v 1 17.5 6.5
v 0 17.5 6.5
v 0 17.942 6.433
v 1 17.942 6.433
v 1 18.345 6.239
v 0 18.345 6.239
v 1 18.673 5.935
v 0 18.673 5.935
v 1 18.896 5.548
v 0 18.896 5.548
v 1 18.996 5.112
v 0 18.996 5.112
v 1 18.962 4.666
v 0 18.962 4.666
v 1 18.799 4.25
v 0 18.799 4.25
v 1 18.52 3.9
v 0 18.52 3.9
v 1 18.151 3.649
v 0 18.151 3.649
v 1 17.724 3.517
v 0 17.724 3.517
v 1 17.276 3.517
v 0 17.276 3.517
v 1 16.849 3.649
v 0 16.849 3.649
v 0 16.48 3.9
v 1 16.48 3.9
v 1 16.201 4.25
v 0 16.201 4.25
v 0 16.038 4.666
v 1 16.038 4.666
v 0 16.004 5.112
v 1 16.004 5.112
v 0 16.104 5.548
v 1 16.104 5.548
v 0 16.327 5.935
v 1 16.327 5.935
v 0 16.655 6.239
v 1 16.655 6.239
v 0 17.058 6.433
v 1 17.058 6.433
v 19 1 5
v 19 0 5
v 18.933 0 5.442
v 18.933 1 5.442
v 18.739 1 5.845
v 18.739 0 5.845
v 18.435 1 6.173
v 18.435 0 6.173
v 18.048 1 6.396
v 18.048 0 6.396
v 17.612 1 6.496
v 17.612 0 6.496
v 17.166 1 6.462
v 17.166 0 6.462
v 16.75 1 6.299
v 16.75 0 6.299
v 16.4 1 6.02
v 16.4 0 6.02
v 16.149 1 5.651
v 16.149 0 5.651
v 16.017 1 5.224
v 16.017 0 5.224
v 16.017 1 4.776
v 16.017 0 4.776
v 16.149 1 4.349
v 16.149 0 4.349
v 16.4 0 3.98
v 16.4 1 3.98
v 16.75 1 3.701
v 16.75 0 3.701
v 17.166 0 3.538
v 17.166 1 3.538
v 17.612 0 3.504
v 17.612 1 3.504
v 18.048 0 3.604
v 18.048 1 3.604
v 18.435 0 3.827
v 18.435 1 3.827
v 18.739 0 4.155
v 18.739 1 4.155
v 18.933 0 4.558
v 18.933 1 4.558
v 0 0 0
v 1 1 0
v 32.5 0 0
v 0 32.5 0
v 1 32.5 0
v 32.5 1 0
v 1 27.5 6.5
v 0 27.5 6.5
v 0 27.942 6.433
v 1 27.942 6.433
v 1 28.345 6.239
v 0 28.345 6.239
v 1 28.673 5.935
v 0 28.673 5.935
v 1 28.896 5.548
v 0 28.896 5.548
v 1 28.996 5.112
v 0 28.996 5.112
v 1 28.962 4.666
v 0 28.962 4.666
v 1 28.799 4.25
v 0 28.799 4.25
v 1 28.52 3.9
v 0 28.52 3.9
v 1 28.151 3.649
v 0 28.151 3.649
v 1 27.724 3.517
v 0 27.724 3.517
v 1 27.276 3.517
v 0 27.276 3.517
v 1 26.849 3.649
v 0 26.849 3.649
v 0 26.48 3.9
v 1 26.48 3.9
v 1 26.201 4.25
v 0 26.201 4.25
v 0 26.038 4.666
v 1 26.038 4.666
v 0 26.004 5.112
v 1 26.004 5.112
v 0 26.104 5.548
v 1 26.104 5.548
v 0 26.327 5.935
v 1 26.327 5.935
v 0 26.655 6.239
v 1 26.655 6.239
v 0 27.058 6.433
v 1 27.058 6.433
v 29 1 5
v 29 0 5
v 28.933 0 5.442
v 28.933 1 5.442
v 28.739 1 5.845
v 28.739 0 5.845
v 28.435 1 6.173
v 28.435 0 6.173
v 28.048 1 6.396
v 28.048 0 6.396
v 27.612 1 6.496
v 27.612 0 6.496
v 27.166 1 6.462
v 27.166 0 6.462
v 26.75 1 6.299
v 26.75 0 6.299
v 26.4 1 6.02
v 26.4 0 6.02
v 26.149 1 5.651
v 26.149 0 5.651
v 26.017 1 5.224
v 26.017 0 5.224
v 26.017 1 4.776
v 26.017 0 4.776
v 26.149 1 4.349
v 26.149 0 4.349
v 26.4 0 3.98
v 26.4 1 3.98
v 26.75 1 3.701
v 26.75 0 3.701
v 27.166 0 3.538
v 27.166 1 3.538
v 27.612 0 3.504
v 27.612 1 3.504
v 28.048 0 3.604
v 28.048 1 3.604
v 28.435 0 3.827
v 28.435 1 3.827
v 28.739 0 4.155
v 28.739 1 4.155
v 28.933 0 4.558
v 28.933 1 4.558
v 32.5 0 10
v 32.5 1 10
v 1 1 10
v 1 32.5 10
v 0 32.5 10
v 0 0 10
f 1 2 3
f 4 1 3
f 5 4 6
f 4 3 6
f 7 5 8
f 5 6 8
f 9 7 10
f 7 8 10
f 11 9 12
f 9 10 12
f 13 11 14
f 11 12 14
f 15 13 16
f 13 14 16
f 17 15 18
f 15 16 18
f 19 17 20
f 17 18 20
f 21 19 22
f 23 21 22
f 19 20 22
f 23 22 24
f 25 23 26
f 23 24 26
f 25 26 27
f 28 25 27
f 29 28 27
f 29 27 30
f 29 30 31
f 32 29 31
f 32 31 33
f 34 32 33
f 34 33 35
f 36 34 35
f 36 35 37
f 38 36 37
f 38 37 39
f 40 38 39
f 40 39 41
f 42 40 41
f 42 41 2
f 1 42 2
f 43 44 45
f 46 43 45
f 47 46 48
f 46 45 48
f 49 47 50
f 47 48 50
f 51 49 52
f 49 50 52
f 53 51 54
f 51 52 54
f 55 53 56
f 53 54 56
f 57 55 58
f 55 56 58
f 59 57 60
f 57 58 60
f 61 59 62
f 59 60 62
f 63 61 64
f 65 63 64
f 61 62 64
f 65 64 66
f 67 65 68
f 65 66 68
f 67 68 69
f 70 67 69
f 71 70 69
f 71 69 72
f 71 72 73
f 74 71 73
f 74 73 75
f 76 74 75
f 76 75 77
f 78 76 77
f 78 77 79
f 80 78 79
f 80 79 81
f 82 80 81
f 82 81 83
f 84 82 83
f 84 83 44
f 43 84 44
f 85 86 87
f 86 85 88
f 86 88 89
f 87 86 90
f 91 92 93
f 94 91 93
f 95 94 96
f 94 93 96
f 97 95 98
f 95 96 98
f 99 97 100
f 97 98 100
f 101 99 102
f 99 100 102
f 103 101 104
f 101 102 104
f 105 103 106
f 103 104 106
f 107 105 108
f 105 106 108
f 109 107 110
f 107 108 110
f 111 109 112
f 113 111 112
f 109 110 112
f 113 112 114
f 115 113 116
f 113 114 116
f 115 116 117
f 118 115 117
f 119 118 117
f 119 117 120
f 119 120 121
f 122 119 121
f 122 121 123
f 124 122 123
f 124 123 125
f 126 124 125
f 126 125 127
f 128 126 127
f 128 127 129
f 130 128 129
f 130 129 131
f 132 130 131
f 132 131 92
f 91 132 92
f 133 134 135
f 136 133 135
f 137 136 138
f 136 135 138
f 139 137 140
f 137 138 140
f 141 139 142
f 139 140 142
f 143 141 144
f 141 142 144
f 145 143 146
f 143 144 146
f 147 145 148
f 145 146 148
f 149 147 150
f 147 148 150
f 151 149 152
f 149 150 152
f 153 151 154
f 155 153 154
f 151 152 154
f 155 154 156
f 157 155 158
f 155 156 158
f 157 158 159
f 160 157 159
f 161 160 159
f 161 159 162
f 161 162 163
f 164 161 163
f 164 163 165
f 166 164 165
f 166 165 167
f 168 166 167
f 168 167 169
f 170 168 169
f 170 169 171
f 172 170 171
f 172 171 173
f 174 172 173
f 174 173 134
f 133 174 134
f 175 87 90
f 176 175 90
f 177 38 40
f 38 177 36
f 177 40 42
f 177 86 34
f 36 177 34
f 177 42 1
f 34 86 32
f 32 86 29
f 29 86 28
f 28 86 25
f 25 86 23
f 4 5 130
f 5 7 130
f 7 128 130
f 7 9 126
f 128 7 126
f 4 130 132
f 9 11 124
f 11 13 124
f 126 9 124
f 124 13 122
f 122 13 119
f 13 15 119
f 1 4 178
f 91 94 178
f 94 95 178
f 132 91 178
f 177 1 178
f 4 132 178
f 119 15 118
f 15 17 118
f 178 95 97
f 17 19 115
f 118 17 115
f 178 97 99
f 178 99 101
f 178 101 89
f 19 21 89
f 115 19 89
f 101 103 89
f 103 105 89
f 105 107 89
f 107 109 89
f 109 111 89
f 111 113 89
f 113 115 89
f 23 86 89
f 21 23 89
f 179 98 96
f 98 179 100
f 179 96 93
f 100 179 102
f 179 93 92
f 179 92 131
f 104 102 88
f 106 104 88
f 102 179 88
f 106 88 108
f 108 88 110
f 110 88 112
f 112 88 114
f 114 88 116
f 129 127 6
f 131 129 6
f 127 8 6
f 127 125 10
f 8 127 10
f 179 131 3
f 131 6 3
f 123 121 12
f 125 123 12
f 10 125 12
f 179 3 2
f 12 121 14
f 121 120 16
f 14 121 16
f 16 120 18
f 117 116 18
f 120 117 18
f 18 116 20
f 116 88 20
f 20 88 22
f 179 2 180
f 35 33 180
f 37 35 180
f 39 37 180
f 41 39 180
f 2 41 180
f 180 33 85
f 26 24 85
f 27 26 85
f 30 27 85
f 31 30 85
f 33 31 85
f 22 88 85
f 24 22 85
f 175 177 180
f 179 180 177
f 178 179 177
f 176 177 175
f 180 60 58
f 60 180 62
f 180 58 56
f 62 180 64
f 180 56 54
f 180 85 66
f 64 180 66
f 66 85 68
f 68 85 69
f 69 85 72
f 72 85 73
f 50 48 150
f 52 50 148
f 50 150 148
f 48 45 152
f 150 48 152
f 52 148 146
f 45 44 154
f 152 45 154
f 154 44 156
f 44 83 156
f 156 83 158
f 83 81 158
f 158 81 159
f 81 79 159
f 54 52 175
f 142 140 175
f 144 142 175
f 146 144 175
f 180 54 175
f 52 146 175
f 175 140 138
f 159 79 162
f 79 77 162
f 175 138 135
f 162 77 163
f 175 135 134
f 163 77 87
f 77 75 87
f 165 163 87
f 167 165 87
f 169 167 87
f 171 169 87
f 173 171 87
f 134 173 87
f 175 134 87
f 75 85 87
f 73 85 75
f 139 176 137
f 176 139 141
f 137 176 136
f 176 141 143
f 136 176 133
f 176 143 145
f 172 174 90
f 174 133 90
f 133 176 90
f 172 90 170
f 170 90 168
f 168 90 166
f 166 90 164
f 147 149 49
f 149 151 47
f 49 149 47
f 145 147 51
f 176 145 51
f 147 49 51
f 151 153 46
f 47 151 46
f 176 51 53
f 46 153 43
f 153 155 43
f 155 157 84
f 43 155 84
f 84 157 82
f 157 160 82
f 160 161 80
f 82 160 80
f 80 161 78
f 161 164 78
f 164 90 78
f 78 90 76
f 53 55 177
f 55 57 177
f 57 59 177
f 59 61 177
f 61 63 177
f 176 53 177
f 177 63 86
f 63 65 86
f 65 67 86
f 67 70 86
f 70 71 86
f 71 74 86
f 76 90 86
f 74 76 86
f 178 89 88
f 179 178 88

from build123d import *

# Parameters (mm, degrees)
BOSS_EXTRU_1_DEPTH         = 10
ESQUISSE2_R                = 1.5
ENL_V_MAT_EXTRU_1_DEPTH    = 33.5
R_P_TITION_LIN_AIRE1_COUNT = 2
R_P_TITION_LIN_AIRE1_PITCH = 10
ESQUISSE3_R                = 1.5
ENL_V_MAT_EXTRU_2_DEPTH    = 33.5
R_P_TITION_LIN_AIRE2_COUNT = 2
R_P_TITION_LIN_AIRE2_PITCH = 10


with BuildPart() as part:
    # Esquisse1 → Boss.-Extru.1 (new body)
    with BuildSketch(Plane.XY):
        Polygon((0, 0), (32.5, 0), (32.5, 1), (1, 1), (1, 32.5), (0, 32.5), align=None)
    extrude(amount=BOSS_EXTRU_1_DEPTH)

    # Esquisse2 → Enlèv. mat.-Extru.1 (cut, through all)
    with BuildSketch(Plane.ZY):
        with Locations((5, 27.5)):
            Circle(ESQUISSE2_R)
    enl_v_mat_extru_1 = extrude(amount=-ENL_V_MAT_EXTRU_1_DEPTH, mode=Mode.SUBTRACT)

    # Répétition linéaire1: Enlèv. mat.-Extru.1 ×2
    with Locations(*[(0, -i * R_P_TITION_LIN_AIRE1_PITCH, 0) for i in range(1, R_P_TITION_LIN_AIRE1_COUNT)]):
        add(enl_v_mat_extru_1, mode=Mode.SUBTRACT)

    # Esquisse3 → Enlèv. mat.-Extru.2 (cut, through all)
    with BuildSketch(Plane.XZ):
        with Locations((27.5, 5)):
            Circle(ESQUISSE3_R)
    enl_v_mat_extru_2 = extrude(amount=-ENL_V_MAT_EXTRU_2_DEPTH, mode=Mode.SUBTRACT)

    # Répétition linéaire2: Enlèv. mat.-Extru.2 ×2
    with Locations(*[(-i * R_P_TITION_LIN_AIRE2_PITCH, 0, 0) for i in range(1, R_P_TITION_LIN_AIRE2_COUNT)]):
        add(enl_v_mat_extru_2, mode=Mode.SUBTRACT)


solid = part.part
